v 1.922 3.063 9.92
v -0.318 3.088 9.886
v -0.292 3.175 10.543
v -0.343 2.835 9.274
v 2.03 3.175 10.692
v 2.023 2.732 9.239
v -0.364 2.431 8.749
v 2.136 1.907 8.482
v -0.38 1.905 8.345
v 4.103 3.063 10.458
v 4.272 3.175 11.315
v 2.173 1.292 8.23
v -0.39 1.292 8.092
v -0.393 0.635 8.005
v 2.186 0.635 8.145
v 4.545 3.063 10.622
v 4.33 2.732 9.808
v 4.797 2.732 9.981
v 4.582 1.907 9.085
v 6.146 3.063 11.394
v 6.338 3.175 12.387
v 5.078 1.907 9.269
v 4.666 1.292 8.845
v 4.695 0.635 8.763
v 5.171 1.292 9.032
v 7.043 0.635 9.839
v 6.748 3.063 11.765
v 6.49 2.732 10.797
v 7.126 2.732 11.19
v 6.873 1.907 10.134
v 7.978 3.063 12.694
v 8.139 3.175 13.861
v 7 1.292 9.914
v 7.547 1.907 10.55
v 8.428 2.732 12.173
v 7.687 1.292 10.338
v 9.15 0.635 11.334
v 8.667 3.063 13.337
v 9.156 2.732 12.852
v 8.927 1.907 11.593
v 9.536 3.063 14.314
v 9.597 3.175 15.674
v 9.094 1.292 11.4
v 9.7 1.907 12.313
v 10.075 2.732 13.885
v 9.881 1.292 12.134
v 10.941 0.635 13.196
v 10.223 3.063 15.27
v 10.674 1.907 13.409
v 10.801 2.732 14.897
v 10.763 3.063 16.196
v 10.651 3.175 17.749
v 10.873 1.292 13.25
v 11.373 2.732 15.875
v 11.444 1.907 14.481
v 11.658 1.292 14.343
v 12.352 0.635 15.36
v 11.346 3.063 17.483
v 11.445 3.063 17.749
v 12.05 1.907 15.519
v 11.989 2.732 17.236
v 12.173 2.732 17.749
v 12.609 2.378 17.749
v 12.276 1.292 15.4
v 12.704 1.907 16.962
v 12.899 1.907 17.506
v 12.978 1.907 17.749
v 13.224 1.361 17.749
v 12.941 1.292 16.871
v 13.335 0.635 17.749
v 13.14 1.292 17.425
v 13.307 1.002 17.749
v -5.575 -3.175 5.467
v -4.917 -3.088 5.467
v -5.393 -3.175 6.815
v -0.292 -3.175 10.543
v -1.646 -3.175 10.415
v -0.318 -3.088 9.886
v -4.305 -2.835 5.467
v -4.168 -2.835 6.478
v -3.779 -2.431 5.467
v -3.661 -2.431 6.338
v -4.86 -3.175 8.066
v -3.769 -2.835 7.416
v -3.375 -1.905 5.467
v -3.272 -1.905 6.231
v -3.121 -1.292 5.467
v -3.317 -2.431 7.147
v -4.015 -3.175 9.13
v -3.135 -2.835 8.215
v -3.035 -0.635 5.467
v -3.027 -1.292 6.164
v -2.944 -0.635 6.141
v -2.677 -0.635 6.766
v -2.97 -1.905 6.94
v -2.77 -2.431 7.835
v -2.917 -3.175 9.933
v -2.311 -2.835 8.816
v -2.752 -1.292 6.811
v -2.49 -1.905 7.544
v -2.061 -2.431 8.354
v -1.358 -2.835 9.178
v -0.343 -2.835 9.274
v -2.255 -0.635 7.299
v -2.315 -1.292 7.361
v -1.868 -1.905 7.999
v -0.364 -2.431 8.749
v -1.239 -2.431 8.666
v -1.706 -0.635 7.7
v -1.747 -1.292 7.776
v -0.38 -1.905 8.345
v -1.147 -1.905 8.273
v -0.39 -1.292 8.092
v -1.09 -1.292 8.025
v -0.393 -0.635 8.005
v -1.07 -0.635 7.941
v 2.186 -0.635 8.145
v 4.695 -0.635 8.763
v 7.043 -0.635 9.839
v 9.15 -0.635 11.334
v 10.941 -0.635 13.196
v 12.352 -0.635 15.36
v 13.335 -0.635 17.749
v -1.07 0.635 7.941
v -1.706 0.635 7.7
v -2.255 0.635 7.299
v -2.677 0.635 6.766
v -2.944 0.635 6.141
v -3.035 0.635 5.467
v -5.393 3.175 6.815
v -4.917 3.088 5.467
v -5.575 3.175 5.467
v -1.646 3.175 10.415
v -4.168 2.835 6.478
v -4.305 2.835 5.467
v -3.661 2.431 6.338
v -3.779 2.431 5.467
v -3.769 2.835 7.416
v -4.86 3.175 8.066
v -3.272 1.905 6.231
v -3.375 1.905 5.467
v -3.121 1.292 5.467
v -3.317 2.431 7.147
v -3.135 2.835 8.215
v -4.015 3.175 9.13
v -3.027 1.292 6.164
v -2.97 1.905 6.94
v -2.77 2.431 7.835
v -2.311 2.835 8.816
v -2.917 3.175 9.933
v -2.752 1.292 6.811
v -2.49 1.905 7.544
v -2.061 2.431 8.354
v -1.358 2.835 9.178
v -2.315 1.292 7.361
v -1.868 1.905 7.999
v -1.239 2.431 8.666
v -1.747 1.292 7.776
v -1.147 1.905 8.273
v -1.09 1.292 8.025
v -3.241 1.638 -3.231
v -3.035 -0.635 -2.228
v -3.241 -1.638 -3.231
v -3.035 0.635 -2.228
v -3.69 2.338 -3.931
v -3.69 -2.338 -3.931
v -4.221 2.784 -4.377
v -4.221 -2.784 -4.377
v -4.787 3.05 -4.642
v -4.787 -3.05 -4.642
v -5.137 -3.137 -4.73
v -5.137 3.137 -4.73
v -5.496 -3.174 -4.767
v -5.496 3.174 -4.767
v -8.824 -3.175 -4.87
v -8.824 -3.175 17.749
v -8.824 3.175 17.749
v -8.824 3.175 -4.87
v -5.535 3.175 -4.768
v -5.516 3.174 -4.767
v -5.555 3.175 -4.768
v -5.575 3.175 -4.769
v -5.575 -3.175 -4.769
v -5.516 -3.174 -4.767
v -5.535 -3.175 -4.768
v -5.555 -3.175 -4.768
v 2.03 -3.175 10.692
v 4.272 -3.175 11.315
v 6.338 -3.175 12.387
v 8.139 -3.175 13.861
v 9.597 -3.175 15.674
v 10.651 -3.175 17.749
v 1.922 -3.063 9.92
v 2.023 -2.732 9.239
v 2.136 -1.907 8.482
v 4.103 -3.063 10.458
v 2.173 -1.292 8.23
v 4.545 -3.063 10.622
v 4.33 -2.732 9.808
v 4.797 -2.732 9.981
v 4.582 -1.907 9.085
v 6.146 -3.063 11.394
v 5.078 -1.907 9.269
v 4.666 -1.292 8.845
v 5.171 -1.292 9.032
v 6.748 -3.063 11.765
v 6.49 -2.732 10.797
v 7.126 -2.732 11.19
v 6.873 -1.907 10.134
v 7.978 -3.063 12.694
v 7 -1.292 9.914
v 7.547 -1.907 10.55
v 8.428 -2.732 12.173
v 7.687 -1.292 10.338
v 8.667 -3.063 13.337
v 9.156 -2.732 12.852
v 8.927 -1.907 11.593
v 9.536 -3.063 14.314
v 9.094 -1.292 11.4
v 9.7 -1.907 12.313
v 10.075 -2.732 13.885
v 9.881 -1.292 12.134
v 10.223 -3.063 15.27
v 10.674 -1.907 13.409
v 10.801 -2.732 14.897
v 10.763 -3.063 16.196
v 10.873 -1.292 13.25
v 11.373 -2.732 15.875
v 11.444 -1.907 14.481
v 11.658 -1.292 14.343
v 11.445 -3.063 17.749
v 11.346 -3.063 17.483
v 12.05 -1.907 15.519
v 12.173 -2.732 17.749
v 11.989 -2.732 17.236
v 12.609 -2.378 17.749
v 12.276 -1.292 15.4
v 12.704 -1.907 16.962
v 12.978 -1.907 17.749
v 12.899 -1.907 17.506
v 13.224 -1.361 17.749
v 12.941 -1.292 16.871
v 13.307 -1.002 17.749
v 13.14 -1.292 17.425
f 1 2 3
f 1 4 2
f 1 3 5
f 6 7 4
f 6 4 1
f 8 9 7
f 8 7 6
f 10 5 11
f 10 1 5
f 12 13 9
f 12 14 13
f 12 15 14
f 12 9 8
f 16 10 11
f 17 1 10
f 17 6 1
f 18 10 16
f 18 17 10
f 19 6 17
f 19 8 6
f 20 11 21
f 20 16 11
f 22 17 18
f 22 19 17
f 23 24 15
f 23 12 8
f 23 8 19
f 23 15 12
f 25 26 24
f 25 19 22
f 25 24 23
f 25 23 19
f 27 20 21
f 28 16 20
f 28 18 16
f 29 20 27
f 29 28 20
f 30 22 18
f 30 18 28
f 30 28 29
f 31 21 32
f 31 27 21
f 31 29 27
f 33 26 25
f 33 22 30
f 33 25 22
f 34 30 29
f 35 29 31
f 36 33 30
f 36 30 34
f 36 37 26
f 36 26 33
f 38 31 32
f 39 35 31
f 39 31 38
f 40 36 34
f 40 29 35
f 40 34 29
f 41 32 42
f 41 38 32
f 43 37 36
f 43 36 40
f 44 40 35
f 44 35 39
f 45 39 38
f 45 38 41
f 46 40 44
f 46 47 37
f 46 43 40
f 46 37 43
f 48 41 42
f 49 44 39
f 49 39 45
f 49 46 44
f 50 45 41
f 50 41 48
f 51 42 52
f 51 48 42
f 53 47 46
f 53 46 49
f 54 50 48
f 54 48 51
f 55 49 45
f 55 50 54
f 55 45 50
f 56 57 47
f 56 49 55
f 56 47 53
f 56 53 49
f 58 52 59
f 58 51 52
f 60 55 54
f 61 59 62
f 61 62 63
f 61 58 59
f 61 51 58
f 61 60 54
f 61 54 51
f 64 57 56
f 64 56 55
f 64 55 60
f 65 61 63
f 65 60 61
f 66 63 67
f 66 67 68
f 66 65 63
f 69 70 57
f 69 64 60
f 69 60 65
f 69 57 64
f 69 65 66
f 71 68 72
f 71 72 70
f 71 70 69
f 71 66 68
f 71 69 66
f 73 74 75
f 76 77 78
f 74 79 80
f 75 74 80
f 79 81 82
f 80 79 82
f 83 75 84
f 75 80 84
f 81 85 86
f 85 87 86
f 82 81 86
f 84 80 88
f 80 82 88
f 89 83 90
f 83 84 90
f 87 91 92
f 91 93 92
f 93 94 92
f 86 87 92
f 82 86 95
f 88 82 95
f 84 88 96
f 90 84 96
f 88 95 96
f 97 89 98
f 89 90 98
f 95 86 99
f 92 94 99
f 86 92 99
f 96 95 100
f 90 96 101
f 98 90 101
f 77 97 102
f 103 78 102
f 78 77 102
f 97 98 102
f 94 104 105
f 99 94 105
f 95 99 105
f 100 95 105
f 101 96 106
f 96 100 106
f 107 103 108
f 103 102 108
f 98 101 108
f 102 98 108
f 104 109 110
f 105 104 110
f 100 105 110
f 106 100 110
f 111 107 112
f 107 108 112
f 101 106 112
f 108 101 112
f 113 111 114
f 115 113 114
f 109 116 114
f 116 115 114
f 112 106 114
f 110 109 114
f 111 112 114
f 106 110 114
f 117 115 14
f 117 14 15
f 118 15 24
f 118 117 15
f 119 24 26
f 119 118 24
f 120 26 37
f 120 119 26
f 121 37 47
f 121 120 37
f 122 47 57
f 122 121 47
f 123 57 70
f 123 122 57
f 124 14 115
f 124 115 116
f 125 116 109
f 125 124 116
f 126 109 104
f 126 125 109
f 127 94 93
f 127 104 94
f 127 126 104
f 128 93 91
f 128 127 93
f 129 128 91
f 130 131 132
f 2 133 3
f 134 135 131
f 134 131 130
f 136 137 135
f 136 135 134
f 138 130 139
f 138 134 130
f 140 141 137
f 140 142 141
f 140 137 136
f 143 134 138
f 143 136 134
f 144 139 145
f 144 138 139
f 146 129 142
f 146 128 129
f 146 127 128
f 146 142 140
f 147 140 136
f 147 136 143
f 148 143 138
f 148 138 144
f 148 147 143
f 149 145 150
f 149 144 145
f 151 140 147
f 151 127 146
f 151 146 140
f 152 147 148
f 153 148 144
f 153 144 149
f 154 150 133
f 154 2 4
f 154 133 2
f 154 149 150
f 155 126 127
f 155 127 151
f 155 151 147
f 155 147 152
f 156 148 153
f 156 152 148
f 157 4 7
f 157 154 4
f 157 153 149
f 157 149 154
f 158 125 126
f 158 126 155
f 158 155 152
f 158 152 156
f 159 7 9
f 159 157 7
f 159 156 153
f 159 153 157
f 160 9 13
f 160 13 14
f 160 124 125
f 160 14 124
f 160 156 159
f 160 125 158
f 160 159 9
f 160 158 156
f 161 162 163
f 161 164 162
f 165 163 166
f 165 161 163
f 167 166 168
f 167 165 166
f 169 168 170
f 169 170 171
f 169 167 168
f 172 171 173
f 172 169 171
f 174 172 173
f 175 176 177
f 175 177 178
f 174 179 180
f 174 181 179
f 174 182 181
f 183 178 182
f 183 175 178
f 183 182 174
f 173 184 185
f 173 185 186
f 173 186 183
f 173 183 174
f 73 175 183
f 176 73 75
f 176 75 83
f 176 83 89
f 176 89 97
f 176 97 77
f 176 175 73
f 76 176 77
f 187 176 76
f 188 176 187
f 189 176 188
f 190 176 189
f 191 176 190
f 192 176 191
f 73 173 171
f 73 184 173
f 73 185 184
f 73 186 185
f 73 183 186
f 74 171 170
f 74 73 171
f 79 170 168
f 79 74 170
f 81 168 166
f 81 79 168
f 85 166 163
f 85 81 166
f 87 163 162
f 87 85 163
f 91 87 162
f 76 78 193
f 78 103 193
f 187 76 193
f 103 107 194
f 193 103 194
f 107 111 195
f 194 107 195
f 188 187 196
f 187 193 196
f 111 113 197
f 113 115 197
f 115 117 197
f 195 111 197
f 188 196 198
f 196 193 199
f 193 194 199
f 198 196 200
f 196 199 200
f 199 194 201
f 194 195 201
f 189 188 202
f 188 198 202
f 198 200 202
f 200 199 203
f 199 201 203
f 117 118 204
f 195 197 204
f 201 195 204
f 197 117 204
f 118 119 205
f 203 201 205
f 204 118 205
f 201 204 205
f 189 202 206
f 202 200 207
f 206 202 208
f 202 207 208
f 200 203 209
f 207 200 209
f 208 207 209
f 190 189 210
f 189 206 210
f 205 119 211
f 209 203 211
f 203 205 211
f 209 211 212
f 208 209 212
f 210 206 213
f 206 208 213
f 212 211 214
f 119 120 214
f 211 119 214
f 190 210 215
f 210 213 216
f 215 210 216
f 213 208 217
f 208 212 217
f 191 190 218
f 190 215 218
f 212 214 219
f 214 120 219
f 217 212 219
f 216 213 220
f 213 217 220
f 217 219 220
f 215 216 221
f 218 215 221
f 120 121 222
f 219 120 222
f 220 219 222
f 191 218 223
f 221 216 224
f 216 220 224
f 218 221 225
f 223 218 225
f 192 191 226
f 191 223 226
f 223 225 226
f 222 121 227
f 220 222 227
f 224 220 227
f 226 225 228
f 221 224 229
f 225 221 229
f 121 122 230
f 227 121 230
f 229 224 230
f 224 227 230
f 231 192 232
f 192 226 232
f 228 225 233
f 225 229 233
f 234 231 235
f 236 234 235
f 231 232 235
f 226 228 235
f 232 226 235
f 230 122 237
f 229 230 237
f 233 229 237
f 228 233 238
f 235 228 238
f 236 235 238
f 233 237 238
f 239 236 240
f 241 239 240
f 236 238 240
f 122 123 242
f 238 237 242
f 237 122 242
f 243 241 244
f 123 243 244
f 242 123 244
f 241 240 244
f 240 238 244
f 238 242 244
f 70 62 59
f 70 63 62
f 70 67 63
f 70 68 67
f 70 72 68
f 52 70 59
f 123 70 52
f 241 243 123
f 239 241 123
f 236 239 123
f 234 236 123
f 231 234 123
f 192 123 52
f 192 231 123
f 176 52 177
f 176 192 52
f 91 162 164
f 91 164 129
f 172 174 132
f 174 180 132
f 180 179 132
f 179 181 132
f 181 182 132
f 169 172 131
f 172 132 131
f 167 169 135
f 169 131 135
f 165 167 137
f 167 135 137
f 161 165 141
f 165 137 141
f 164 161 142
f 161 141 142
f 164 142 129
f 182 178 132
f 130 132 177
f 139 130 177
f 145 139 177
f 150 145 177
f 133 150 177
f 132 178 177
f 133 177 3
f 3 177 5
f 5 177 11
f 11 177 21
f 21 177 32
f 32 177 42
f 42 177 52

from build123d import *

# Parameters (mm, degrees)
F1_DEPTH = 3.175
F2_F1_R  = 2.54
F2_F2_R  = 2.54


with BuildPart() as f1:
    # F0 (on Front) → F1 (new body, symmetric)
    with BuildSketch(Plane.XZ):
        with BuildLine():
            Line((13.3350007236, 17.7493449301), (-3.0348624568, 17.7493449301))
            Line((-3.0348624568, 17.7493449301), (-3.0348624568, 8.3688618615))
            ThreePointArc((-3.0348624568, 8.3688618615), (7.007326367, 9.8180073261), (13.3350007236, 17.7493449301))
        make_face()
        Polygon((-3.0348624568, 8.3688618615), (-3.0348624568, 17.7493449301), (-8.8243288919, 17.7493449301), (-8.8243288919, -4.8698359169), (-3.0348624568, -4.6902415343), align=None)
    extrude(amount=F1_DEPTH, both=True)

    # F2: fillet of radius 2.54 on 4 edges, made by hand

    # F2_f1
    f2_f1_edges = [f1.edges().sort_by_distance(p)[0] for p in [
        (-3.0348624568, 0, 8.3688618615),
    ]]
    fillet(f2_f1_edges, radius=F2_F1_R)

    # F2_f2
    f2_f2_edges = [f1.edges().sort_by_distance(p)[0] for p in [
        (-3.0348624568, 3.175, 0.3884883664),
        (-3.0348624568, -3.175, 0.3884883664),
        (-3.0348624568, 0, -4.6902415343),
        (-2.2547093843, -3.175, 7.2987582727),
        (-2.2547093843, 3.175, 7.2987582727),
    ]]
    fillet(f2_f2_edges, radius=F2_F2_R)


solid = f1.part
